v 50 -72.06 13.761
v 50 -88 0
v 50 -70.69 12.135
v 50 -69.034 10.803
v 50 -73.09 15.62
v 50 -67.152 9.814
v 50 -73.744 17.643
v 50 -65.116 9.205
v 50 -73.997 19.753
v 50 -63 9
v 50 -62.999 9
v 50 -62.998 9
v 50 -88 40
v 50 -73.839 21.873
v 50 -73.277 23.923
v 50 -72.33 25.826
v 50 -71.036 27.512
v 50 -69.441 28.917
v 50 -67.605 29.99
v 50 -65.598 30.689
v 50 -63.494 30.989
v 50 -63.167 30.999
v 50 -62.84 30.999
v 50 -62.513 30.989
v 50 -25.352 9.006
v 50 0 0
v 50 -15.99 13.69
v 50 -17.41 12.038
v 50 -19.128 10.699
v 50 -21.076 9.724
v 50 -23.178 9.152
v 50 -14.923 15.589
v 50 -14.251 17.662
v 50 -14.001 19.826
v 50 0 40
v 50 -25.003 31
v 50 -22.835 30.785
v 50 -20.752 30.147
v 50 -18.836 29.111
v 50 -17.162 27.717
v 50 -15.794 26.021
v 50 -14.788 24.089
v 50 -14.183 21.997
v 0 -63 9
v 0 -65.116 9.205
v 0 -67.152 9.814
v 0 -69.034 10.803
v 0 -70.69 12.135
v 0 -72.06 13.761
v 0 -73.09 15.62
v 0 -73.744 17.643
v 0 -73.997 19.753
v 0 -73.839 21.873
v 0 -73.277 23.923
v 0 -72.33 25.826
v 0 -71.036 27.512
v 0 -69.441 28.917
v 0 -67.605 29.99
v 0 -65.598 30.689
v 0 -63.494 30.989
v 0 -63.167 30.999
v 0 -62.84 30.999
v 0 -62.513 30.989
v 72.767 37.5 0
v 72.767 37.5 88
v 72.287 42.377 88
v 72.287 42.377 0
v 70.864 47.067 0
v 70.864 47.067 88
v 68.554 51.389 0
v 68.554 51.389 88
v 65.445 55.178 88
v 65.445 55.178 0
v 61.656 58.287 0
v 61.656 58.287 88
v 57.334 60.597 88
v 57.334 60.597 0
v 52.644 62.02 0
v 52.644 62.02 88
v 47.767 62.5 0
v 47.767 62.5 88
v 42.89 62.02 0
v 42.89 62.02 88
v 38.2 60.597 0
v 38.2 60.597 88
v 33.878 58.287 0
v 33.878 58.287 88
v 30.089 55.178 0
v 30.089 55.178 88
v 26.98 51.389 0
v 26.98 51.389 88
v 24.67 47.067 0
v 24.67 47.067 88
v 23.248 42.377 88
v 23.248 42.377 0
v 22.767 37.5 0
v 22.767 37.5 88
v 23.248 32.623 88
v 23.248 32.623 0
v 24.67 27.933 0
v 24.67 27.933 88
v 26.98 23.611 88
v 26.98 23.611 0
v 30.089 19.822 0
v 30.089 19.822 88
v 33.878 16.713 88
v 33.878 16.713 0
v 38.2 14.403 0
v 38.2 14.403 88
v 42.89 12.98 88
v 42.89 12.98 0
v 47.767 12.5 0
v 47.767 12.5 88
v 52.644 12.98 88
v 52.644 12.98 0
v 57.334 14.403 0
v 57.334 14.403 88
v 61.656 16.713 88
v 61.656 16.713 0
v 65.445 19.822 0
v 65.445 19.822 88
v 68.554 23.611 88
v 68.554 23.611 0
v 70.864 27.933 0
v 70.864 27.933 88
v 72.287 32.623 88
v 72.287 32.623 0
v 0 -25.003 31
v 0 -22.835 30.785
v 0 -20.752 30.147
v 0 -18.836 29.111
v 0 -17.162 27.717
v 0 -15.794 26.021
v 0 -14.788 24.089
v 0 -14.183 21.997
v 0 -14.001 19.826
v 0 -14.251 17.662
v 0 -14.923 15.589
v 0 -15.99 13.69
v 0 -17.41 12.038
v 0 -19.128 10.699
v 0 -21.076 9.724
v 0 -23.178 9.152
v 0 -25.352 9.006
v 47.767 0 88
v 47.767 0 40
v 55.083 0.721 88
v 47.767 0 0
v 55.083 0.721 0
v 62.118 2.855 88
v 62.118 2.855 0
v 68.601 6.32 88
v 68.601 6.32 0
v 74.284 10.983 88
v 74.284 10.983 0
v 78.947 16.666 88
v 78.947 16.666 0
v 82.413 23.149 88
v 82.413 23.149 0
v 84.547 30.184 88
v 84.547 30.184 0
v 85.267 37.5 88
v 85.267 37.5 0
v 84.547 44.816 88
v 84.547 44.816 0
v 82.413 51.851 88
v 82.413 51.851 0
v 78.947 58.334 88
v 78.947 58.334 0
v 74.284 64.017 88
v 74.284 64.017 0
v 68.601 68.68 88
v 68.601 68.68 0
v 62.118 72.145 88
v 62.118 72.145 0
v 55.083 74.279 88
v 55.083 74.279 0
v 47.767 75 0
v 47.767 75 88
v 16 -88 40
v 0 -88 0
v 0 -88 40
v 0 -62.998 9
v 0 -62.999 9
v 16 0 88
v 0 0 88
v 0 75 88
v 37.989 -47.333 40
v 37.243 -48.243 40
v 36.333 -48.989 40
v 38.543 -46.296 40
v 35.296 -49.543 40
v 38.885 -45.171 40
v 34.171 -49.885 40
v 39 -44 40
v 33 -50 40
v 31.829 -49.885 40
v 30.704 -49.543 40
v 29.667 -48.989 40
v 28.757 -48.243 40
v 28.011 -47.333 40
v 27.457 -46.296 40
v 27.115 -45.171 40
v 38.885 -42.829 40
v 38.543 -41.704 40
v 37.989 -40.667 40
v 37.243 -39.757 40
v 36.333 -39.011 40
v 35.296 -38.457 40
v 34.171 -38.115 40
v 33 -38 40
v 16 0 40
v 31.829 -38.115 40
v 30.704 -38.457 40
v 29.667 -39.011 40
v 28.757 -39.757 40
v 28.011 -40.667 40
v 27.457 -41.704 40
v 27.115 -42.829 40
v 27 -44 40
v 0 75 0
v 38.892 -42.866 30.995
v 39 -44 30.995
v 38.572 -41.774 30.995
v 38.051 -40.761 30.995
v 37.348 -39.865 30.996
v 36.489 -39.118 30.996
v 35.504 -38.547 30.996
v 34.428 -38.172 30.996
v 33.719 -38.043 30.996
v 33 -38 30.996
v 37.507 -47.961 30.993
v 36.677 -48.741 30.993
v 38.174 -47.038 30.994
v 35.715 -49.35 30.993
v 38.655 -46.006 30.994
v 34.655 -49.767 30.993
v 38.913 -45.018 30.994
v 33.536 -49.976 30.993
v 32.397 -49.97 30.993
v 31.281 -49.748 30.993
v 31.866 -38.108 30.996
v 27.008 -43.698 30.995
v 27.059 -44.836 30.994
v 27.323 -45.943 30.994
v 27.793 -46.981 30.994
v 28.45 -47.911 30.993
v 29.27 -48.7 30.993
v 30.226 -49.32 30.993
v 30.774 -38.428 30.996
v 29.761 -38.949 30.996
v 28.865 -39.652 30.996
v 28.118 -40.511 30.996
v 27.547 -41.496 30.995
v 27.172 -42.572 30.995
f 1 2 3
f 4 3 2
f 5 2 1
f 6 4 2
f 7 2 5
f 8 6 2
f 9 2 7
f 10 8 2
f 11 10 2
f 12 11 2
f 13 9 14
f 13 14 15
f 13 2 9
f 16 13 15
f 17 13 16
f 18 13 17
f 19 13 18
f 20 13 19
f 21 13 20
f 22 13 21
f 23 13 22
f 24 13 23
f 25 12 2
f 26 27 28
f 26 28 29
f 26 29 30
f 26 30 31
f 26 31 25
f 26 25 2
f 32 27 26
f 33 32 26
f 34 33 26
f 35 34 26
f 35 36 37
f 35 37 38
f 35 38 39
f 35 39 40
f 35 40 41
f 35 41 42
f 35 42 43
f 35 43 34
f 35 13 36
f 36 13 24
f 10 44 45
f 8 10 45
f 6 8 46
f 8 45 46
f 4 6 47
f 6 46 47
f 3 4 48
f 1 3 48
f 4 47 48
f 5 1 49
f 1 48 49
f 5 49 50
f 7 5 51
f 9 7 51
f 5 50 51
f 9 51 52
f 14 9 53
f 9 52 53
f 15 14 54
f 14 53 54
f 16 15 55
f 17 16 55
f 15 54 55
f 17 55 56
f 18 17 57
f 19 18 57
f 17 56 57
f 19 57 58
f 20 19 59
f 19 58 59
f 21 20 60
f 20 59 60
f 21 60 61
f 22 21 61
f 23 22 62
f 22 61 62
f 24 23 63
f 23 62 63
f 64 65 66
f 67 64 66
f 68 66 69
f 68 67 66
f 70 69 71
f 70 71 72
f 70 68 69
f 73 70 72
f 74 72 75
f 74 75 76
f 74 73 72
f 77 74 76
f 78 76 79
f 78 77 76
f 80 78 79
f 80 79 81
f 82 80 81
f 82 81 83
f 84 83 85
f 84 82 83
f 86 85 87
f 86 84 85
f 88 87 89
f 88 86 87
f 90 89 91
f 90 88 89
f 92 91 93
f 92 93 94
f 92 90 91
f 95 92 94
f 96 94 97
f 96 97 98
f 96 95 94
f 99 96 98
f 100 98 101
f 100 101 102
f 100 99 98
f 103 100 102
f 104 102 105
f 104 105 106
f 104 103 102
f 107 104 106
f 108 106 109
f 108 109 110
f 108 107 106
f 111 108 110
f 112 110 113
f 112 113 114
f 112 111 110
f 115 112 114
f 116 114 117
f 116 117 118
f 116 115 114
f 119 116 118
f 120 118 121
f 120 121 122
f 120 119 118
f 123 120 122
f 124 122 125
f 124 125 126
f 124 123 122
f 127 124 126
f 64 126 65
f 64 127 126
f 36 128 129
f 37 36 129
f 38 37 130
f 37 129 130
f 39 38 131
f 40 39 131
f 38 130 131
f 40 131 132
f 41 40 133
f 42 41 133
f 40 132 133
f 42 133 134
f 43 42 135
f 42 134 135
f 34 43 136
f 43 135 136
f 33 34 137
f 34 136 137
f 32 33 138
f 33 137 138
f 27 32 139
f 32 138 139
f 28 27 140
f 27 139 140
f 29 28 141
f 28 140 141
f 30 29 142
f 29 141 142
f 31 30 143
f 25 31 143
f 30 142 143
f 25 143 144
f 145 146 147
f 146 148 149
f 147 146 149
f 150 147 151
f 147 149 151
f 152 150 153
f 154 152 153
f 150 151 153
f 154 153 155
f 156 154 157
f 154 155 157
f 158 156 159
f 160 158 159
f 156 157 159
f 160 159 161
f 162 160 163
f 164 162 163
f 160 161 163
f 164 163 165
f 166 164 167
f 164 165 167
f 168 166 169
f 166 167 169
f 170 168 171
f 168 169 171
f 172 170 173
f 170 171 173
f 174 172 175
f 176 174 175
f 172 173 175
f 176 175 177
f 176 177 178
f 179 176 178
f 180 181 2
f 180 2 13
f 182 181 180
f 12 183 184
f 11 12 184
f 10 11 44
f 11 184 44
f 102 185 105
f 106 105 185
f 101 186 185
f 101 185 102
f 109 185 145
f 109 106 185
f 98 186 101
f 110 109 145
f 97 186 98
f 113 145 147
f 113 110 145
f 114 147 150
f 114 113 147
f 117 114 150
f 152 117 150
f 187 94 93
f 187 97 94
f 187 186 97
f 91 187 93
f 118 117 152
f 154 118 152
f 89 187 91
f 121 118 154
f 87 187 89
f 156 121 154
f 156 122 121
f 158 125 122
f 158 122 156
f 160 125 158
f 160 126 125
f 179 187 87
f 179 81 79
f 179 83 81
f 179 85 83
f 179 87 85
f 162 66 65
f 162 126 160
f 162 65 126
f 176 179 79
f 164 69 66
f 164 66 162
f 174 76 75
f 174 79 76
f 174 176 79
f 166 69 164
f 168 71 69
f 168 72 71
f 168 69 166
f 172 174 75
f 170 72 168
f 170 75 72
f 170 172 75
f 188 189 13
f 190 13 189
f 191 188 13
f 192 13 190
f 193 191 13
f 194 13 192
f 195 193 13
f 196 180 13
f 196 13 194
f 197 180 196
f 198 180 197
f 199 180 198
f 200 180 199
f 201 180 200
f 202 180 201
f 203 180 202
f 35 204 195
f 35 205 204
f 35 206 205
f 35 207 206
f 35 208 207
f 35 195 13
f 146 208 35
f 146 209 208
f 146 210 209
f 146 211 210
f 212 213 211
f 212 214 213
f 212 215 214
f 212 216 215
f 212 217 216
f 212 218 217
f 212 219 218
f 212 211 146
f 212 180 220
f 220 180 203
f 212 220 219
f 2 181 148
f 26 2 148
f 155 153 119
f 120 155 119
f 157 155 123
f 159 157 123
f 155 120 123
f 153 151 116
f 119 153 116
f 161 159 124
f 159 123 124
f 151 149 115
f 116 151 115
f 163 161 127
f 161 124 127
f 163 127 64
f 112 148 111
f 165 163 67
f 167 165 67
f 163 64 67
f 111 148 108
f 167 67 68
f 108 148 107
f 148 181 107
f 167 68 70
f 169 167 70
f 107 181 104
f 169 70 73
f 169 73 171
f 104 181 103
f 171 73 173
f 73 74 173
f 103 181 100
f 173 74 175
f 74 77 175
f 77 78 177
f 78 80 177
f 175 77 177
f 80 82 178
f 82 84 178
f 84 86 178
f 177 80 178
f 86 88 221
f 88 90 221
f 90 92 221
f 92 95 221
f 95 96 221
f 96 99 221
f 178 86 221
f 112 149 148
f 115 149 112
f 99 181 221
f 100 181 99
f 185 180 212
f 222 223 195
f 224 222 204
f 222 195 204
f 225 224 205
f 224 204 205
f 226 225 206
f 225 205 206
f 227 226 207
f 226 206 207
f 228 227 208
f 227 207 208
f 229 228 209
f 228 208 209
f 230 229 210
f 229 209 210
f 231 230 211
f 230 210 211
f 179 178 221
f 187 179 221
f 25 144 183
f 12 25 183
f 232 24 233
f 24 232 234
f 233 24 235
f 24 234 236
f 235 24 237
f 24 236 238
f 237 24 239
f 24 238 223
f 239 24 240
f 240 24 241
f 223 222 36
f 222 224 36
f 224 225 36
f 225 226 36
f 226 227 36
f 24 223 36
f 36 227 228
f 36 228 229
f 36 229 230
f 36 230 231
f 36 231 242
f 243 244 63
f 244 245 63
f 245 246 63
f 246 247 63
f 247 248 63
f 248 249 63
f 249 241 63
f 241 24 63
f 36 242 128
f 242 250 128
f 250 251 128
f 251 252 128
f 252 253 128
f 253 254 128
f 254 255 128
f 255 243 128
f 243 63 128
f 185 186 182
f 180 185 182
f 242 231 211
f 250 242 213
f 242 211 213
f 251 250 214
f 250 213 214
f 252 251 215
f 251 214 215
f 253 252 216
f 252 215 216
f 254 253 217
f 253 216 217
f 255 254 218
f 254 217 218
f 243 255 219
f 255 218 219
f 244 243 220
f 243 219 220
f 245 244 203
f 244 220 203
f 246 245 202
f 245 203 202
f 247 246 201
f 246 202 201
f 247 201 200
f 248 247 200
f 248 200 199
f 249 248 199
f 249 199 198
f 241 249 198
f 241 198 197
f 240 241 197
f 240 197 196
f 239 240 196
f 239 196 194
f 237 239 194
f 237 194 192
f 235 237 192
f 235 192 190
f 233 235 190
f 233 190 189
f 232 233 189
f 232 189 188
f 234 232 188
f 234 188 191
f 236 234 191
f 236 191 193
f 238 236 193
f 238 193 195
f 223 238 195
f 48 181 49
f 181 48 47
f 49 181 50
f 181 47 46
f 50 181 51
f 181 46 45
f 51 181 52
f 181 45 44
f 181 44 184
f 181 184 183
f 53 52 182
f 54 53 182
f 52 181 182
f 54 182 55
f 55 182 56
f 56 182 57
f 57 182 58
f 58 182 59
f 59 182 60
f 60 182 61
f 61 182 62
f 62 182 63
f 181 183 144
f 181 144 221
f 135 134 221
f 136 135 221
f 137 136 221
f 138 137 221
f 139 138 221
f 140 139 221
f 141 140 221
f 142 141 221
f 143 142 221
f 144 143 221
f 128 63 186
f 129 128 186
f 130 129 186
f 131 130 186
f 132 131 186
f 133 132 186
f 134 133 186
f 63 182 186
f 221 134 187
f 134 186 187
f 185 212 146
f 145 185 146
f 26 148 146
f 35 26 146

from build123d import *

# Parameters (mm, degrees)
F0_R     = 25
F1_DEPTH = 88
F2_W     = 88
F2_H     = 40
F3_DEPTH = 50
F5_DEPTH = 16
F7_DEPTH = 9.008194986


with BuildPart() as f1:
    # F0 (on Top) → F1 (new body)
    with BuildSketch(Plane.XY):
        with BuildLine():
            Line((0, 75), (0, 0))
            Line((0, 0), (47.7671325207, 0))
            ThreePointArc((47.7671325207, 0), (85.2671325207, 37.5), (47.7671325207, 75))
            Line((47.7671325207, 75), (0, 75))
        make_face()
        with Locations((47.7671325207, 37.5)):
            Circle(F0_R, mode=Mode.SUBTRACT)
    extrude(amount=F1_DEPTH)

    # F2 (on Right) → F3 (join)
    with BuildSketch(Plane.YZ):
        with Locations((-44, 20)):
            Rectangle(F2_W, F2_H)
        with BuildLine():
            ThreePointArc((-63.4935666774, 30.9889213272), (-63.0031659942, 30.9999995444), (-62.5127590152, 30.989203621))
            Line((-62.5127590152, 30.989203621), (-25.0031659942, 30.9999995444))
            ThreePointArc((-25.0031659942, 30.9999995444), (-14.0013797727, 19.8257786016), (-25.3515634815, 9.0056194755))
            Line((-25.3515634815, 9.0056194755), (-62.9983580838, 9.0000001225))
            ThreePointArc((-62.9983580838, 9.0000001225), (-62.9991790419, 9.0000000306), (-63, 9))
            ThreePointArc((-63, 9), (-73.997229983, 19.7531545007), (-63.4935666774, 30.9889213272))
        make_face(mode=Mode.SUBTRACT)
    extrude(amount=F3_DEPTH)

    # F4 (on Right) → F5 (join)
    with BuildSketch(Plane.YZ):
        Polygon((-88, 40), (0, 40), (0, 88), align=None)
    extrude(amount=F5_DEPTH)

    # F6 (on face) → F7 (cut, through all)
    with BuildSketch(Plane.XY.offset(40)):
        with BuildLine():
            ThreePointArc((39, -44), (37.2426406871, -39.7573593129), (33, -38))
            ThreePointArc((33, -38), (28.7573593129, -48.2426406871), (39, -44))
        make_face()
    extrude(amount=-F7_DEPTH, mode=Mode.SUBTRACT)


solid = f1.part
